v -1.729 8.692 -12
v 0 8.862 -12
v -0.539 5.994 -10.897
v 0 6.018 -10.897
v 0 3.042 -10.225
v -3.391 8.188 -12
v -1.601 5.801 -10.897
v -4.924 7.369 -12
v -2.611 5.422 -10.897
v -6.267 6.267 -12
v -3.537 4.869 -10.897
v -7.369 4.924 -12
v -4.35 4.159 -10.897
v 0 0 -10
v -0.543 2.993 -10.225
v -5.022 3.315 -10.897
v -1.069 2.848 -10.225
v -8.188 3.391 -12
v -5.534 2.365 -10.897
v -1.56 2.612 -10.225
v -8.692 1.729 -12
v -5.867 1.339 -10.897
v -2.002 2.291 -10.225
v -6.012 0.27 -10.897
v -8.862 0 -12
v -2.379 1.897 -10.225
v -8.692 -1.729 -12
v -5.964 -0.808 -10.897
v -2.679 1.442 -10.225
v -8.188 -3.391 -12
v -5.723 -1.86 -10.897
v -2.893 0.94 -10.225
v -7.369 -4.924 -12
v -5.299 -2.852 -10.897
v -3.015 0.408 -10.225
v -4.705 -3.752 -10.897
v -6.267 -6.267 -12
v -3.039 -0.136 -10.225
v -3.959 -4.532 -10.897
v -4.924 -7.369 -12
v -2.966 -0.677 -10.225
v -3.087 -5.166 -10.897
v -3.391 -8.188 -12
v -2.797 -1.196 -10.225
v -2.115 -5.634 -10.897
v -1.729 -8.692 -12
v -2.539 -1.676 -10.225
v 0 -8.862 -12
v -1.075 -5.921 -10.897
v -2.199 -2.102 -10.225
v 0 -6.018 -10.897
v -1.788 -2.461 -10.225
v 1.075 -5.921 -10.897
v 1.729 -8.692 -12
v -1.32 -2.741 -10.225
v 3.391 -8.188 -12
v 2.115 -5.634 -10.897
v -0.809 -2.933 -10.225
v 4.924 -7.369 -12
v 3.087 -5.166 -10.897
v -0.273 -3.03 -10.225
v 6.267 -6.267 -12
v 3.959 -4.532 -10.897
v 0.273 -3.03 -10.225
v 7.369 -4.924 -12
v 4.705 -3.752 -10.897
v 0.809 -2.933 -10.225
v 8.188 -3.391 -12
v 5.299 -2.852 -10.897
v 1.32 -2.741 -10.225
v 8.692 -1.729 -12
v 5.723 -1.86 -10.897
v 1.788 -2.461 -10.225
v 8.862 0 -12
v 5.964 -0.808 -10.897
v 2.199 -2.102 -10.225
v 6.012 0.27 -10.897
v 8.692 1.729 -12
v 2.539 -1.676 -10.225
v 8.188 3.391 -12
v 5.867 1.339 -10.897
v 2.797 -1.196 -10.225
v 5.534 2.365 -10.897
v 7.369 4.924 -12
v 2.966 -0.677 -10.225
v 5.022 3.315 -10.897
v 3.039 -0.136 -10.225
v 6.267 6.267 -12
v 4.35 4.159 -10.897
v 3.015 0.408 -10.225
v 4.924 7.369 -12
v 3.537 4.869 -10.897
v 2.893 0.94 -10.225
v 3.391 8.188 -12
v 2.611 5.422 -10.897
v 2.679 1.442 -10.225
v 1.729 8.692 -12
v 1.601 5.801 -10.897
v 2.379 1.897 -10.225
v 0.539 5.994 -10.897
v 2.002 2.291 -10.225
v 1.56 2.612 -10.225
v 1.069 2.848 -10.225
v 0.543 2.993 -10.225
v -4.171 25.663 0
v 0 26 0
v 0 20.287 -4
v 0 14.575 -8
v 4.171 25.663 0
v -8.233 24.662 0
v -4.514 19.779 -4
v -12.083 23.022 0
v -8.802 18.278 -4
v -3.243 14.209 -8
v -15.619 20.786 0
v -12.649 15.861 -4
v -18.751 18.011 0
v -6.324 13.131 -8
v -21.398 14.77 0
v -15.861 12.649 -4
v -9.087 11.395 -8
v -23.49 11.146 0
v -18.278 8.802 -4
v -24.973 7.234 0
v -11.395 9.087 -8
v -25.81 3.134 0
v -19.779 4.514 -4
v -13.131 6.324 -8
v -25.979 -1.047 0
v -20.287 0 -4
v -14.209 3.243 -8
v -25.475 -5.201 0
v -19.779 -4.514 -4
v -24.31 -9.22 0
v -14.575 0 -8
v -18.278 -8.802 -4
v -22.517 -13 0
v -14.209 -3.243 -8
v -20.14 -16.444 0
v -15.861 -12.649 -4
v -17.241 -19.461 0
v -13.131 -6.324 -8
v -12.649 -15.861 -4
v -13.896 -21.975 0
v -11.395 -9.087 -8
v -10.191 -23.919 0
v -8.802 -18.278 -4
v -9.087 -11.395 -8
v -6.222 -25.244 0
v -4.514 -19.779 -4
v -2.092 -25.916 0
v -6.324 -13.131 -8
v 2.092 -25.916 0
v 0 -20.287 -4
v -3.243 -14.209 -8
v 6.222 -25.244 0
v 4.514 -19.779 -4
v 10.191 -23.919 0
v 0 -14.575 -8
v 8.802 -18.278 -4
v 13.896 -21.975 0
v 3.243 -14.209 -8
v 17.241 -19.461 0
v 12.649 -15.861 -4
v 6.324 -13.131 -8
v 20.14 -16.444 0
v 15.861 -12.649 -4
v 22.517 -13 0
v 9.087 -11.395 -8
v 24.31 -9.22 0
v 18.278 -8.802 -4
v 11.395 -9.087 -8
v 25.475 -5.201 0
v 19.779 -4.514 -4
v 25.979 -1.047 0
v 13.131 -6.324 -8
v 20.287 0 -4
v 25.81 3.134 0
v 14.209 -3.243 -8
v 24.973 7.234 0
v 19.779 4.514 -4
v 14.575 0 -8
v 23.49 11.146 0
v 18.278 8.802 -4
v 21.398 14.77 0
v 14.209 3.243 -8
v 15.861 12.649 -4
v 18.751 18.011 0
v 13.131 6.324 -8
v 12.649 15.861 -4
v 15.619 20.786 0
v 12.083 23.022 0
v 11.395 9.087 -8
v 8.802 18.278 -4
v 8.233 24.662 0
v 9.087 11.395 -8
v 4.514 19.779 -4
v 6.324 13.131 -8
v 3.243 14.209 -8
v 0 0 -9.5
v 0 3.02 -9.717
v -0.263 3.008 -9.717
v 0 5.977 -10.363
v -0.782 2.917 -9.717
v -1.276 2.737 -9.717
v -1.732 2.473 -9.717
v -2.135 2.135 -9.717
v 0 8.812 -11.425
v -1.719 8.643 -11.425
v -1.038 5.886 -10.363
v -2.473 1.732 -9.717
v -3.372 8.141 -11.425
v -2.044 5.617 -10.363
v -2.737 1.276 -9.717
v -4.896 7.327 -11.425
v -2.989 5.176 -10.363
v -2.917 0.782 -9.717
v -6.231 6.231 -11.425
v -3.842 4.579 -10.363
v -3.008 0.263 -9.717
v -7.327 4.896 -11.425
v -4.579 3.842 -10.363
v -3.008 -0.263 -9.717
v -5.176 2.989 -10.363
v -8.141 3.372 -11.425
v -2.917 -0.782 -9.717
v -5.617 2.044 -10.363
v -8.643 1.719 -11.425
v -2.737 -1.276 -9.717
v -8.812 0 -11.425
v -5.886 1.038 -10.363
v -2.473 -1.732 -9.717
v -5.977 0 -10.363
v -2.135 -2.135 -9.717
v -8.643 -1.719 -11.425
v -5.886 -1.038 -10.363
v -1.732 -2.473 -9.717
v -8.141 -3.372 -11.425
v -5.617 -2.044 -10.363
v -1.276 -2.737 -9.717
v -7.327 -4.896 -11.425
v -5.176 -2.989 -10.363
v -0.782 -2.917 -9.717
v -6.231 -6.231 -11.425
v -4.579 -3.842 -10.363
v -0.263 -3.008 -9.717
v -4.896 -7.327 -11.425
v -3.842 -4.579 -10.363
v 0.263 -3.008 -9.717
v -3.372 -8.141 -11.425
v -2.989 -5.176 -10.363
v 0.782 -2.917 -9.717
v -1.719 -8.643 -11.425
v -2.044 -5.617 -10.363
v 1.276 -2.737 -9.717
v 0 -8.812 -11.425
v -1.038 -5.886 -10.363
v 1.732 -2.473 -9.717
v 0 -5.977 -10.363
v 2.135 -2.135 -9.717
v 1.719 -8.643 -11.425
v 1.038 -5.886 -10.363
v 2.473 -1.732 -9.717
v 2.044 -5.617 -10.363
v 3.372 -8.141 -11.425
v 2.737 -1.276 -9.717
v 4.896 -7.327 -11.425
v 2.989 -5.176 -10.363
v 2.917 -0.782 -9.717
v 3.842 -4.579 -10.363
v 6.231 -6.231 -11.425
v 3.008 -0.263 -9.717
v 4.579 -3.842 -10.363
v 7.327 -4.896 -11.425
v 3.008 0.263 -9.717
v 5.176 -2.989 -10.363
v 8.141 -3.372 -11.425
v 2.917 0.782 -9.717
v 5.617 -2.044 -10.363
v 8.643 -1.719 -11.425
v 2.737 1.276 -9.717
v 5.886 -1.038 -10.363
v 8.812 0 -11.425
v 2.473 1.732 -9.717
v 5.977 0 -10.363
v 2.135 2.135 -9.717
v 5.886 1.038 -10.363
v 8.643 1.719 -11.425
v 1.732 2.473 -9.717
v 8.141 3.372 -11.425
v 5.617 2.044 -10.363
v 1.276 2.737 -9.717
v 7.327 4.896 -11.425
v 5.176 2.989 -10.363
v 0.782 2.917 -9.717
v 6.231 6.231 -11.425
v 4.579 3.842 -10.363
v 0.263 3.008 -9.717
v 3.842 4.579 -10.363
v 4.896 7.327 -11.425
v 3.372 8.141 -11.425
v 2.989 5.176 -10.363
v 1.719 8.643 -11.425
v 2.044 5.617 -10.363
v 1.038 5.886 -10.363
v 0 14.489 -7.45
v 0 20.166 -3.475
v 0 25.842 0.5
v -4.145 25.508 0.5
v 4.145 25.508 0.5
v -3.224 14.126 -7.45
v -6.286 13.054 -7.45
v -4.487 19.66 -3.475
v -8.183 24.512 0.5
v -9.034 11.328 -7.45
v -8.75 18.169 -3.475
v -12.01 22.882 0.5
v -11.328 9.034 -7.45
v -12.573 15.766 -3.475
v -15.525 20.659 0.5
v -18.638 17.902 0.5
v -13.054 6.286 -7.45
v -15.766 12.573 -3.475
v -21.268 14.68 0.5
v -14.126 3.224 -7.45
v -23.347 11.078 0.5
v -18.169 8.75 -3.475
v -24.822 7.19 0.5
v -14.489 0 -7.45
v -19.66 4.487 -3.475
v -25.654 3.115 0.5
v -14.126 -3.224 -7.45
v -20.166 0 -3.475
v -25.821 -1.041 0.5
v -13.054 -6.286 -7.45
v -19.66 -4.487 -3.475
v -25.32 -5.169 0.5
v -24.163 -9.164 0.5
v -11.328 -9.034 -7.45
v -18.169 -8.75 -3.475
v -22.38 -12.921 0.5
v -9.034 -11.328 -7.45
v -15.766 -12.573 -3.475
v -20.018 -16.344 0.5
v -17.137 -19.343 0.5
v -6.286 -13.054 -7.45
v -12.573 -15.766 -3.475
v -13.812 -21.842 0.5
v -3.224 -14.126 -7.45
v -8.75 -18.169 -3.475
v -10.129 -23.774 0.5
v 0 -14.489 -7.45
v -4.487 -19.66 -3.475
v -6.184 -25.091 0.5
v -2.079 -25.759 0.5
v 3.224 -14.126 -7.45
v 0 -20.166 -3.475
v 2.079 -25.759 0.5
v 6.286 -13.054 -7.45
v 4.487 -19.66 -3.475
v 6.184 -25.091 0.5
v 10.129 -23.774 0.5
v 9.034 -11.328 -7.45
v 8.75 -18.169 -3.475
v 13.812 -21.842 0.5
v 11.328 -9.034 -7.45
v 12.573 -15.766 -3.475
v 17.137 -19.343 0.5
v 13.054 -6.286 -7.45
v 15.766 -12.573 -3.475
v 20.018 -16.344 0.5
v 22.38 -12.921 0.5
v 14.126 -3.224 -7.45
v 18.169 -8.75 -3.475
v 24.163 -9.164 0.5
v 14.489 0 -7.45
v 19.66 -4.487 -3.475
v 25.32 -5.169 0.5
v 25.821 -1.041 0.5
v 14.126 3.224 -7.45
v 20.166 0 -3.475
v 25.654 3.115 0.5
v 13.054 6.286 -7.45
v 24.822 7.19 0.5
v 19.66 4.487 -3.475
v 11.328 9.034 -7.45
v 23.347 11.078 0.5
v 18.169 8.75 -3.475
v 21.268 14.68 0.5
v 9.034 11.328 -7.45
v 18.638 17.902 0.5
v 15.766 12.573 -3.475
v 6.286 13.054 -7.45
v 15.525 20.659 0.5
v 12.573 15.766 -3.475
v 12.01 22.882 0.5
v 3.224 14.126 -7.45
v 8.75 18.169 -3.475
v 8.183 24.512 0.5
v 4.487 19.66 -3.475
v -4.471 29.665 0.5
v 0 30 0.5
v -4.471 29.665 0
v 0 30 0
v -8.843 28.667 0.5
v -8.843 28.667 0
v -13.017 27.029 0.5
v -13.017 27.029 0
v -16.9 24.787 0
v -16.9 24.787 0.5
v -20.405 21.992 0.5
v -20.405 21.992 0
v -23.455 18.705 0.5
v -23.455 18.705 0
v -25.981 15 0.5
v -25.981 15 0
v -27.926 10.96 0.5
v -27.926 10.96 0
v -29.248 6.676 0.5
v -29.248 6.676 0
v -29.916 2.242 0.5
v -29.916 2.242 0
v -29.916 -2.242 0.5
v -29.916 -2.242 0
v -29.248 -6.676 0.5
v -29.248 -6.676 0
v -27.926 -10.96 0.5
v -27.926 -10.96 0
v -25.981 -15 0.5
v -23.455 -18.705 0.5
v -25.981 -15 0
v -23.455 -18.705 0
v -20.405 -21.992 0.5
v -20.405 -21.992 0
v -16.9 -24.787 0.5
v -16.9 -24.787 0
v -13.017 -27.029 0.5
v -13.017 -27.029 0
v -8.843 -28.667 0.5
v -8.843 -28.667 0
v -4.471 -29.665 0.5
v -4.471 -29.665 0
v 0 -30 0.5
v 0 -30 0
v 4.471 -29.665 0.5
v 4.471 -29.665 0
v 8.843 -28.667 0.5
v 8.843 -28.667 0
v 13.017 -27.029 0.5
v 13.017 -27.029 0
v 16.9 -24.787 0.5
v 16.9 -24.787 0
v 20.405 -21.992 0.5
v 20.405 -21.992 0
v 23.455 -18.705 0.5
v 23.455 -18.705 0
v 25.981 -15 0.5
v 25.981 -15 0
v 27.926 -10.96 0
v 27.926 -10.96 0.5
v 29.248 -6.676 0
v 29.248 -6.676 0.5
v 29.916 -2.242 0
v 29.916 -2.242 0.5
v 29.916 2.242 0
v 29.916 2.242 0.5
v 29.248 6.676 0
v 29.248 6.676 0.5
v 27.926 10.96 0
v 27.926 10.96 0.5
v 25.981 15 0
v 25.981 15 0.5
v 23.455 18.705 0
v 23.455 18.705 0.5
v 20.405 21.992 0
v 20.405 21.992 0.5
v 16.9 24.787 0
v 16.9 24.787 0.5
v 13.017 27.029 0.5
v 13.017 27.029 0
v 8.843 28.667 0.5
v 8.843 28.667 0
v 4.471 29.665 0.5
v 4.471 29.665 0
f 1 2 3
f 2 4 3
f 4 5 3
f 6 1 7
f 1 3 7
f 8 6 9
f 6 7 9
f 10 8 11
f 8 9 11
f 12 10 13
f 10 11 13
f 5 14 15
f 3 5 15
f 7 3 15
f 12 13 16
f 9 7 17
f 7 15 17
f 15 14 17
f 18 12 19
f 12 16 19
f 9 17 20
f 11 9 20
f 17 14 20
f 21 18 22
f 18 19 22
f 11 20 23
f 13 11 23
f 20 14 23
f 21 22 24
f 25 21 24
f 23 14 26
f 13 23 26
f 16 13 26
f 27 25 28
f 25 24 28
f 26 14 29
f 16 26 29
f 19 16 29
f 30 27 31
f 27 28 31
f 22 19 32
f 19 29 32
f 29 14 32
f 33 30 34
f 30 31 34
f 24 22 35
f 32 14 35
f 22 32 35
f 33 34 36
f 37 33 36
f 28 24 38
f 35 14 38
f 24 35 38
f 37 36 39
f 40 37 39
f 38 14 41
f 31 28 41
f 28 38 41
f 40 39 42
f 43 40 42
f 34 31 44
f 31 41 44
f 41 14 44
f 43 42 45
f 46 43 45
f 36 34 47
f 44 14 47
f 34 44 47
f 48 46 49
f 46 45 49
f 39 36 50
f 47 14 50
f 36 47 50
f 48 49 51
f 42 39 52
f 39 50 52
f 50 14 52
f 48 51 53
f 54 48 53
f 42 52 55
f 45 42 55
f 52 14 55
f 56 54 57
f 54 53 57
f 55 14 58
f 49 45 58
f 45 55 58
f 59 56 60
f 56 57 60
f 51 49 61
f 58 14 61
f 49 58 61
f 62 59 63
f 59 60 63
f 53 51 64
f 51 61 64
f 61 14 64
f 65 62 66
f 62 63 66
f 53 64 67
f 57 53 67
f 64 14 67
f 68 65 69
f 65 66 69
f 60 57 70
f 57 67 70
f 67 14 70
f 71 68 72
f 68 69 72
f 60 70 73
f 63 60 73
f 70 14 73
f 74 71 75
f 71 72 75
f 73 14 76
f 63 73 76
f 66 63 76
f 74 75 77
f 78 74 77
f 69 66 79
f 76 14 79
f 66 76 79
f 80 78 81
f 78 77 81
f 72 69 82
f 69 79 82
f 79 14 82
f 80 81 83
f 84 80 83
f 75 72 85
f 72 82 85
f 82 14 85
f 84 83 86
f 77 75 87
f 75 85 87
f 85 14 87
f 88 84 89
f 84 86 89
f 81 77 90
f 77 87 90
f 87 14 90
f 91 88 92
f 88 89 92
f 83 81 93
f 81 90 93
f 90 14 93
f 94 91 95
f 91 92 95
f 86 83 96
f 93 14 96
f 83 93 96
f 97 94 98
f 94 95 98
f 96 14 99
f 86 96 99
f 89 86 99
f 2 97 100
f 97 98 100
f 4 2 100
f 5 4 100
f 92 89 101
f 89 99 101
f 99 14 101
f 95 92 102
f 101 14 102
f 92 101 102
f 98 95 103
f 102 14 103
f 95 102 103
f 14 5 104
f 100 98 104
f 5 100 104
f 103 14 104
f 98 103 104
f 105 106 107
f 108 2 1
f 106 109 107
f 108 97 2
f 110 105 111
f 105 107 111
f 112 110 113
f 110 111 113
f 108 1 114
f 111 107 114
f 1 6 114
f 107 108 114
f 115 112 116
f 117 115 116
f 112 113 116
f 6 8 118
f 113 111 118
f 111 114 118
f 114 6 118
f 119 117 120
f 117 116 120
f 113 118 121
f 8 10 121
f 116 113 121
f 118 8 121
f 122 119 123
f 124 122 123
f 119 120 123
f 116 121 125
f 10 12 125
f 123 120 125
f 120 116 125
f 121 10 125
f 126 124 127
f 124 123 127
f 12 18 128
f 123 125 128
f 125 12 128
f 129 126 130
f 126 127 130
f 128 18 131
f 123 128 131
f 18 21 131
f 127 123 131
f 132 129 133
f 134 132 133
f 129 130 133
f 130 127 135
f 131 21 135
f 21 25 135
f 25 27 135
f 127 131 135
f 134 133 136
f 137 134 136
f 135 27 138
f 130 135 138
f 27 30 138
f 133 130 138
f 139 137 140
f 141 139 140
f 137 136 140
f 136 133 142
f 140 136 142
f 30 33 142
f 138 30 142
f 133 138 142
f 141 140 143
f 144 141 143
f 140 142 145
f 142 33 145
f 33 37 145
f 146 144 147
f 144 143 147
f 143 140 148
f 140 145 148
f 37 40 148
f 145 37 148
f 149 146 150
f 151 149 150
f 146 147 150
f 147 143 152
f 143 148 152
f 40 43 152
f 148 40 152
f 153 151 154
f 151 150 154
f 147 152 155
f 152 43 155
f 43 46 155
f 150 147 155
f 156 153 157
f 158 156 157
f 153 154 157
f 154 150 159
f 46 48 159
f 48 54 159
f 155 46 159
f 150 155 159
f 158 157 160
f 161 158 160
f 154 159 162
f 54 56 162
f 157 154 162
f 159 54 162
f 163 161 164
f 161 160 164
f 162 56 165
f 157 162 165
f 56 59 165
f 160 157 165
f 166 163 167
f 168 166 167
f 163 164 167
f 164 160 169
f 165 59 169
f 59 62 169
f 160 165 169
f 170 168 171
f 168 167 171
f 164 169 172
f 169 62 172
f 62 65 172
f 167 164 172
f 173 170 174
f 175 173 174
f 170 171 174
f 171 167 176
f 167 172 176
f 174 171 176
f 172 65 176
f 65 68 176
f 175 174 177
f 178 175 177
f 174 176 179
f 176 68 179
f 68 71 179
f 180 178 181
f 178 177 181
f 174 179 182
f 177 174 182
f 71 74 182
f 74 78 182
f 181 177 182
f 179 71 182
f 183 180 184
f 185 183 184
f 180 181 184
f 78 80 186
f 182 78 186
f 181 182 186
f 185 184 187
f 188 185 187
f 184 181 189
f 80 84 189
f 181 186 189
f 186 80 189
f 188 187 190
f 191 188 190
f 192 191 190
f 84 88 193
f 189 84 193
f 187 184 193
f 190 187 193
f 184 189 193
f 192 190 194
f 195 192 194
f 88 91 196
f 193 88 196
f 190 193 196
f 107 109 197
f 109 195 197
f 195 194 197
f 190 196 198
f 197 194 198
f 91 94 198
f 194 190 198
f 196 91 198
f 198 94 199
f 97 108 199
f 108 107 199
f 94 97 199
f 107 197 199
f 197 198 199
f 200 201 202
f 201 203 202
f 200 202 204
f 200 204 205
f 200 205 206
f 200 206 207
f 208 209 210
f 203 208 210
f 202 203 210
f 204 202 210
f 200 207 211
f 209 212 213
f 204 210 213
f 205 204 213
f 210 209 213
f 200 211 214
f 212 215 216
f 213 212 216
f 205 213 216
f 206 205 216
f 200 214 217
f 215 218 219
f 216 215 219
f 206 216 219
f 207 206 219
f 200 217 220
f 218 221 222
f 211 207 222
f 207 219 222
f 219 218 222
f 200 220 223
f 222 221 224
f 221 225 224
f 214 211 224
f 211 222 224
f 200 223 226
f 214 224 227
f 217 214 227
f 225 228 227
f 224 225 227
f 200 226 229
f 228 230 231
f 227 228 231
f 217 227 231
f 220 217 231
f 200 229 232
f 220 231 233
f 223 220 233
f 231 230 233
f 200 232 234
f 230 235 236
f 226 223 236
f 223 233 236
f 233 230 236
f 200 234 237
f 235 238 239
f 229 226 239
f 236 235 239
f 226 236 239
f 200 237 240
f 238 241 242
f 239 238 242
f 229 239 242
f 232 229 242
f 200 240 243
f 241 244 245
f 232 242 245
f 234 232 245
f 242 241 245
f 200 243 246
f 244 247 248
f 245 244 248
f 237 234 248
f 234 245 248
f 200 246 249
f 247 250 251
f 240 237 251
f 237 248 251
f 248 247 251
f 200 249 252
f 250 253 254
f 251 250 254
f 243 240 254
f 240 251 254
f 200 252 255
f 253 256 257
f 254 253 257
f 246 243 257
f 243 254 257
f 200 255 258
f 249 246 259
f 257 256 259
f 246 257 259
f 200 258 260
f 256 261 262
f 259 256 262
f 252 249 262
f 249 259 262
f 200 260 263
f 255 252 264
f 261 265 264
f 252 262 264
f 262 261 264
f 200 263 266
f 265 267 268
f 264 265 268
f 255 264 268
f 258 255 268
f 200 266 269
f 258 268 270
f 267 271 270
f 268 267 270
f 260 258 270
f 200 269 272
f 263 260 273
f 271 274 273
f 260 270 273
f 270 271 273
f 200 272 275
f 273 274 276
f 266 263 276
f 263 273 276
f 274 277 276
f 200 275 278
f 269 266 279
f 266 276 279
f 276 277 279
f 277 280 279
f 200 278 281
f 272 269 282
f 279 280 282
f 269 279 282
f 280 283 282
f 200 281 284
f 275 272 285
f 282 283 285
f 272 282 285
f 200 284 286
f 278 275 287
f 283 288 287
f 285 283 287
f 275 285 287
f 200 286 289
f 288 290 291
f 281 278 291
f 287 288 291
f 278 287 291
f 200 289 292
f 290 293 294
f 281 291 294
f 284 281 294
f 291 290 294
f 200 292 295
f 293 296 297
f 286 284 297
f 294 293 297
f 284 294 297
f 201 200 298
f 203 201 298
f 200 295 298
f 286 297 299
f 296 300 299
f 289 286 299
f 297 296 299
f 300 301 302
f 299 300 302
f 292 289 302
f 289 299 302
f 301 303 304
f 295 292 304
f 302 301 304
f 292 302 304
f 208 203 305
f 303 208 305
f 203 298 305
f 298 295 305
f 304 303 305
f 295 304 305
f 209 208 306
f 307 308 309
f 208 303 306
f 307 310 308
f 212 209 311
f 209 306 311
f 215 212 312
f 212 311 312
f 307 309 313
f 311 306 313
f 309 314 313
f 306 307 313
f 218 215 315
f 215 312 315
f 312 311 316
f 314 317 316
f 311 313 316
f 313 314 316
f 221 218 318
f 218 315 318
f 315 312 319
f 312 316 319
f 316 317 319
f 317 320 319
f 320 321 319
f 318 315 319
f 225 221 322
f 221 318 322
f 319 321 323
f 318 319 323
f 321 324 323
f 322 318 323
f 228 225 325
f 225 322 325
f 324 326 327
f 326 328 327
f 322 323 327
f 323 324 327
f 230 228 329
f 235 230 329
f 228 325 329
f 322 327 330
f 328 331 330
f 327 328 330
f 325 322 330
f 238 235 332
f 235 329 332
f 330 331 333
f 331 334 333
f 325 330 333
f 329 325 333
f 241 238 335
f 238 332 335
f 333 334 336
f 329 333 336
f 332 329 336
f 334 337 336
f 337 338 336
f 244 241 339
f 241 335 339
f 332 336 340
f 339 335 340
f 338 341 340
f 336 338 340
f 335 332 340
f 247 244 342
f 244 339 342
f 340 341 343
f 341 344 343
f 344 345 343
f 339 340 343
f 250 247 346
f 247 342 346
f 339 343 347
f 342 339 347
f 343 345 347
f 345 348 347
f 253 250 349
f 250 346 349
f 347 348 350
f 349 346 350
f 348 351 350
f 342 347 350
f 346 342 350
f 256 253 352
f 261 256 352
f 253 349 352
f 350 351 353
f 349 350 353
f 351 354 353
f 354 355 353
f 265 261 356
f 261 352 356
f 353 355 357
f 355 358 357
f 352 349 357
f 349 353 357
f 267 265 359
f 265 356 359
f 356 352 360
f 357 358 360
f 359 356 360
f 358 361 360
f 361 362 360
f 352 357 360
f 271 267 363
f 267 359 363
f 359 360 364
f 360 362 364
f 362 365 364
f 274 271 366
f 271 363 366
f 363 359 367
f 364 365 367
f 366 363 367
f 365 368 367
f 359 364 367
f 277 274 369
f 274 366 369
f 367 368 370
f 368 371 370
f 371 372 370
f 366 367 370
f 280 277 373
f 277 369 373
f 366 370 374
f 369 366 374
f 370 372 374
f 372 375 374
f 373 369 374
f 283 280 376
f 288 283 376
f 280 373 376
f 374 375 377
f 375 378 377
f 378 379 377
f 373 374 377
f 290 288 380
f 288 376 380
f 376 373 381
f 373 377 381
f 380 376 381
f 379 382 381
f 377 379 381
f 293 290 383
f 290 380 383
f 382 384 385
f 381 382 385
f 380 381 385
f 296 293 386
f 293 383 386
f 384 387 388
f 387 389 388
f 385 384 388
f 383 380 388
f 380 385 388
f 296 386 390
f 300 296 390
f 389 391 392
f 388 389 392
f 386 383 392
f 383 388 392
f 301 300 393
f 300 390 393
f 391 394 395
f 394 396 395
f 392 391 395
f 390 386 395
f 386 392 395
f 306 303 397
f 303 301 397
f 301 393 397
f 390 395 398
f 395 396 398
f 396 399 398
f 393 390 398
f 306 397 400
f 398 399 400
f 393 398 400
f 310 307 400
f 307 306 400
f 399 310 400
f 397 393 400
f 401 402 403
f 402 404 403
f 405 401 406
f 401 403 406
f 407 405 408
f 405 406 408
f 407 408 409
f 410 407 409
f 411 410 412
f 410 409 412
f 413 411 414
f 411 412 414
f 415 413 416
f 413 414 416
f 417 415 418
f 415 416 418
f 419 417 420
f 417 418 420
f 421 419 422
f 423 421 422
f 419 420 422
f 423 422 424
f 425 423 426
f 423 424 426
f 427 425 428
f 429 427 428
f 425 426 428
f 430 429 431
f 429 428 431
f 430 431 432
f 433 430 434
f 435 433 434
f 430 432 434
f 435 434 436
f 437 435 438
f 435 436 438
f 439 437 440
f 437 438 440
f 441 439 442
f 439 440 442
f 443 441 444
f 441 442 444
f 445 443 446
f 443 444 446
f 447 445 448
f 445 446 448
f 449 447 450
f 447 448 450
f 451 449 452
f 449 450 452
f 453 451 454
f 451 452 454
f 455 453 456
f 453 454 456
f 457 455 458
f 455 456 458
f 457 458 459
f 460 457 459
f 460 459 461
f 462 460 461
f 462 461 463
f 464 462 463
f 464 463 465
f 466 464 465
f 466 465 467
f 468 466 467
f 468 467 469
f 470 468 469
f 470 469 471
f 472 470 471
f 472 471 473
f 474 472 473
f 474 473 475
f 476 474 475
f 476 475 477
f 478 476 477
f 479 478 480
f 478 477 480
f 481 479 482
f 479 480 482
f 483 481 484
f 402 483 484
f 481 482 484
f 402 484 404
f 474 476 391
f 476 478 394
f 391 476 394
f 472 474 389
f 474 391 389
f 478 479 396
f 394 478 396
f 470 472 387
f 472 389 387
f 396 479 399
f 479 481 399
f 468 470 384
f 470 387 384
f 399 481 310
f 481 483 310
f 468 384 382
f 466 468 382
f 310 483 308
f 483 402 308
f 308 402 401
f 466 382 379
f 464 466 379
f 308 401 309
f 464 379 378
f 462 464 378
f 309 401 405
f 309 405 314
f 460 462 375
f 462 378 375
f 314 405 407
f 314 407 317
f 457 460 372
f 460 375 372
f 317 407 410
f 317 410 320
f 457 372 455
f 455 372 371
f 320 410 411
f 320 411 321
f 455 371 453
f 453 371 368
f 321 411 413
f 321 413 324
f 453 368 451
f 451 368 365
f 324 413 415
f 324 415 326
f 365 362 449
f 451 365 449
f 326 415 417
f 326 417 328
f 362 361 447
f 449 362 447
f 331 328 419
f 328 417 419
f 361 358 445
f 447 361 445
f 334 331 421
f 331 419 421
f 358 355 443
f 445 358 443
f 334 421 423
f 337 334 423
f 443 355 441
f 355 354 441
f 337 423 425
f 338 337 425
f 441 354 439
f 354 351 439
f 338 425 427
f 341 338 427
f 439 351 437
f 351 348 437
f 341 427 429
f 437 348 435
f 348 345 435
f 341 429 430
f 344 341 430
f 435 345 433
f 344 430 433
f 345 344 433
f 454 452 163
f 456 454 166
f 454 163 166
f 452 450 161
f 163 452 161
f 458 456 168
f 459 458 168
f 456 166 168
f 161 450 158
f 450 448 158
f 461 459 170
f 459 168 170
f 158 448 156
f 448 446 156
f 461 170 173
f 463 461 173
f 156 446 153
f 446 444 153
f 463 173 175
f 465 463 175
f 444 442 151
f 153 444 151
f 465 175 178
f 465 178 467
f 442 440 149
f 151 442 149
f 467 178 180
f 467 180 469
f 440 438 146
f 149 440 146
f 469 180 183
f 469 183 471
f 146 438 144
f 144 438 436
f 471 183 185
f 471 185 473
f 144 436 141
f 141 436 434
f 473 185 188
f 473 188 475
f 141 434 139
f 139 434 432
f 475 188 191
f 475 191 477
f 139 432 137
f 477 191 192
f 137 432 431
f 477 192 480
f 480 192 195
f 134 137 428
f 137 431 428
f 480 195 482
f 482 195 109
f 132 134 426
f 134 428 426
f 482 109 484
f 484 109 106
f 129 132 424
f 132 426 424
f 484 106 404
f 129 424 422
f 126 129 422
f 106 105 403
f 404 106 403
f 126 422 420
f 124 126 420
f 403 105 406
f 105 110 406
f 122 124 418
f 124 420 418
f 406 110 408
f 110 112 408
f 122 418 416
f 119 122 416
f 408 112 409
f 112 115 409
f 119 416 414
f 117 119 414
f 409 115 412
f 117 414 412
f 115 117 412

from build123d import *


with BuildPart() as part:
    # Sketch1 → Revolve-Thin1 (revolve)
    with BuildSketch(Plane(origin=(0, 0, 0), x_dir=(0, 0, -1), z_dir=(1, 0, 0))):
        with BuildLine():
            Line((0, 30), (0, 26))
            Line((0, 26), (12, 8.862223919))
            ThreePointArc((12, 8.862223919), (10.506209129, 4.542549196), (10, 0))
            Line((10, 0), (9.5, 0))
            ThreePointArc((9.5, 0), (9.986787691, 4.509912766), (11.42472682, 8.812075766))
            Line((11.42472682, 8.812075766), (-0.5, 25.842350606))
            Line((-0.5, 25.842350606), (-0.5, 30))
            Line((-0.5, 30), (0, 30))
        make_face()
    revolve(axis=Axis((0, 0, -12), (0, 0, 1)))


solid = part.part
